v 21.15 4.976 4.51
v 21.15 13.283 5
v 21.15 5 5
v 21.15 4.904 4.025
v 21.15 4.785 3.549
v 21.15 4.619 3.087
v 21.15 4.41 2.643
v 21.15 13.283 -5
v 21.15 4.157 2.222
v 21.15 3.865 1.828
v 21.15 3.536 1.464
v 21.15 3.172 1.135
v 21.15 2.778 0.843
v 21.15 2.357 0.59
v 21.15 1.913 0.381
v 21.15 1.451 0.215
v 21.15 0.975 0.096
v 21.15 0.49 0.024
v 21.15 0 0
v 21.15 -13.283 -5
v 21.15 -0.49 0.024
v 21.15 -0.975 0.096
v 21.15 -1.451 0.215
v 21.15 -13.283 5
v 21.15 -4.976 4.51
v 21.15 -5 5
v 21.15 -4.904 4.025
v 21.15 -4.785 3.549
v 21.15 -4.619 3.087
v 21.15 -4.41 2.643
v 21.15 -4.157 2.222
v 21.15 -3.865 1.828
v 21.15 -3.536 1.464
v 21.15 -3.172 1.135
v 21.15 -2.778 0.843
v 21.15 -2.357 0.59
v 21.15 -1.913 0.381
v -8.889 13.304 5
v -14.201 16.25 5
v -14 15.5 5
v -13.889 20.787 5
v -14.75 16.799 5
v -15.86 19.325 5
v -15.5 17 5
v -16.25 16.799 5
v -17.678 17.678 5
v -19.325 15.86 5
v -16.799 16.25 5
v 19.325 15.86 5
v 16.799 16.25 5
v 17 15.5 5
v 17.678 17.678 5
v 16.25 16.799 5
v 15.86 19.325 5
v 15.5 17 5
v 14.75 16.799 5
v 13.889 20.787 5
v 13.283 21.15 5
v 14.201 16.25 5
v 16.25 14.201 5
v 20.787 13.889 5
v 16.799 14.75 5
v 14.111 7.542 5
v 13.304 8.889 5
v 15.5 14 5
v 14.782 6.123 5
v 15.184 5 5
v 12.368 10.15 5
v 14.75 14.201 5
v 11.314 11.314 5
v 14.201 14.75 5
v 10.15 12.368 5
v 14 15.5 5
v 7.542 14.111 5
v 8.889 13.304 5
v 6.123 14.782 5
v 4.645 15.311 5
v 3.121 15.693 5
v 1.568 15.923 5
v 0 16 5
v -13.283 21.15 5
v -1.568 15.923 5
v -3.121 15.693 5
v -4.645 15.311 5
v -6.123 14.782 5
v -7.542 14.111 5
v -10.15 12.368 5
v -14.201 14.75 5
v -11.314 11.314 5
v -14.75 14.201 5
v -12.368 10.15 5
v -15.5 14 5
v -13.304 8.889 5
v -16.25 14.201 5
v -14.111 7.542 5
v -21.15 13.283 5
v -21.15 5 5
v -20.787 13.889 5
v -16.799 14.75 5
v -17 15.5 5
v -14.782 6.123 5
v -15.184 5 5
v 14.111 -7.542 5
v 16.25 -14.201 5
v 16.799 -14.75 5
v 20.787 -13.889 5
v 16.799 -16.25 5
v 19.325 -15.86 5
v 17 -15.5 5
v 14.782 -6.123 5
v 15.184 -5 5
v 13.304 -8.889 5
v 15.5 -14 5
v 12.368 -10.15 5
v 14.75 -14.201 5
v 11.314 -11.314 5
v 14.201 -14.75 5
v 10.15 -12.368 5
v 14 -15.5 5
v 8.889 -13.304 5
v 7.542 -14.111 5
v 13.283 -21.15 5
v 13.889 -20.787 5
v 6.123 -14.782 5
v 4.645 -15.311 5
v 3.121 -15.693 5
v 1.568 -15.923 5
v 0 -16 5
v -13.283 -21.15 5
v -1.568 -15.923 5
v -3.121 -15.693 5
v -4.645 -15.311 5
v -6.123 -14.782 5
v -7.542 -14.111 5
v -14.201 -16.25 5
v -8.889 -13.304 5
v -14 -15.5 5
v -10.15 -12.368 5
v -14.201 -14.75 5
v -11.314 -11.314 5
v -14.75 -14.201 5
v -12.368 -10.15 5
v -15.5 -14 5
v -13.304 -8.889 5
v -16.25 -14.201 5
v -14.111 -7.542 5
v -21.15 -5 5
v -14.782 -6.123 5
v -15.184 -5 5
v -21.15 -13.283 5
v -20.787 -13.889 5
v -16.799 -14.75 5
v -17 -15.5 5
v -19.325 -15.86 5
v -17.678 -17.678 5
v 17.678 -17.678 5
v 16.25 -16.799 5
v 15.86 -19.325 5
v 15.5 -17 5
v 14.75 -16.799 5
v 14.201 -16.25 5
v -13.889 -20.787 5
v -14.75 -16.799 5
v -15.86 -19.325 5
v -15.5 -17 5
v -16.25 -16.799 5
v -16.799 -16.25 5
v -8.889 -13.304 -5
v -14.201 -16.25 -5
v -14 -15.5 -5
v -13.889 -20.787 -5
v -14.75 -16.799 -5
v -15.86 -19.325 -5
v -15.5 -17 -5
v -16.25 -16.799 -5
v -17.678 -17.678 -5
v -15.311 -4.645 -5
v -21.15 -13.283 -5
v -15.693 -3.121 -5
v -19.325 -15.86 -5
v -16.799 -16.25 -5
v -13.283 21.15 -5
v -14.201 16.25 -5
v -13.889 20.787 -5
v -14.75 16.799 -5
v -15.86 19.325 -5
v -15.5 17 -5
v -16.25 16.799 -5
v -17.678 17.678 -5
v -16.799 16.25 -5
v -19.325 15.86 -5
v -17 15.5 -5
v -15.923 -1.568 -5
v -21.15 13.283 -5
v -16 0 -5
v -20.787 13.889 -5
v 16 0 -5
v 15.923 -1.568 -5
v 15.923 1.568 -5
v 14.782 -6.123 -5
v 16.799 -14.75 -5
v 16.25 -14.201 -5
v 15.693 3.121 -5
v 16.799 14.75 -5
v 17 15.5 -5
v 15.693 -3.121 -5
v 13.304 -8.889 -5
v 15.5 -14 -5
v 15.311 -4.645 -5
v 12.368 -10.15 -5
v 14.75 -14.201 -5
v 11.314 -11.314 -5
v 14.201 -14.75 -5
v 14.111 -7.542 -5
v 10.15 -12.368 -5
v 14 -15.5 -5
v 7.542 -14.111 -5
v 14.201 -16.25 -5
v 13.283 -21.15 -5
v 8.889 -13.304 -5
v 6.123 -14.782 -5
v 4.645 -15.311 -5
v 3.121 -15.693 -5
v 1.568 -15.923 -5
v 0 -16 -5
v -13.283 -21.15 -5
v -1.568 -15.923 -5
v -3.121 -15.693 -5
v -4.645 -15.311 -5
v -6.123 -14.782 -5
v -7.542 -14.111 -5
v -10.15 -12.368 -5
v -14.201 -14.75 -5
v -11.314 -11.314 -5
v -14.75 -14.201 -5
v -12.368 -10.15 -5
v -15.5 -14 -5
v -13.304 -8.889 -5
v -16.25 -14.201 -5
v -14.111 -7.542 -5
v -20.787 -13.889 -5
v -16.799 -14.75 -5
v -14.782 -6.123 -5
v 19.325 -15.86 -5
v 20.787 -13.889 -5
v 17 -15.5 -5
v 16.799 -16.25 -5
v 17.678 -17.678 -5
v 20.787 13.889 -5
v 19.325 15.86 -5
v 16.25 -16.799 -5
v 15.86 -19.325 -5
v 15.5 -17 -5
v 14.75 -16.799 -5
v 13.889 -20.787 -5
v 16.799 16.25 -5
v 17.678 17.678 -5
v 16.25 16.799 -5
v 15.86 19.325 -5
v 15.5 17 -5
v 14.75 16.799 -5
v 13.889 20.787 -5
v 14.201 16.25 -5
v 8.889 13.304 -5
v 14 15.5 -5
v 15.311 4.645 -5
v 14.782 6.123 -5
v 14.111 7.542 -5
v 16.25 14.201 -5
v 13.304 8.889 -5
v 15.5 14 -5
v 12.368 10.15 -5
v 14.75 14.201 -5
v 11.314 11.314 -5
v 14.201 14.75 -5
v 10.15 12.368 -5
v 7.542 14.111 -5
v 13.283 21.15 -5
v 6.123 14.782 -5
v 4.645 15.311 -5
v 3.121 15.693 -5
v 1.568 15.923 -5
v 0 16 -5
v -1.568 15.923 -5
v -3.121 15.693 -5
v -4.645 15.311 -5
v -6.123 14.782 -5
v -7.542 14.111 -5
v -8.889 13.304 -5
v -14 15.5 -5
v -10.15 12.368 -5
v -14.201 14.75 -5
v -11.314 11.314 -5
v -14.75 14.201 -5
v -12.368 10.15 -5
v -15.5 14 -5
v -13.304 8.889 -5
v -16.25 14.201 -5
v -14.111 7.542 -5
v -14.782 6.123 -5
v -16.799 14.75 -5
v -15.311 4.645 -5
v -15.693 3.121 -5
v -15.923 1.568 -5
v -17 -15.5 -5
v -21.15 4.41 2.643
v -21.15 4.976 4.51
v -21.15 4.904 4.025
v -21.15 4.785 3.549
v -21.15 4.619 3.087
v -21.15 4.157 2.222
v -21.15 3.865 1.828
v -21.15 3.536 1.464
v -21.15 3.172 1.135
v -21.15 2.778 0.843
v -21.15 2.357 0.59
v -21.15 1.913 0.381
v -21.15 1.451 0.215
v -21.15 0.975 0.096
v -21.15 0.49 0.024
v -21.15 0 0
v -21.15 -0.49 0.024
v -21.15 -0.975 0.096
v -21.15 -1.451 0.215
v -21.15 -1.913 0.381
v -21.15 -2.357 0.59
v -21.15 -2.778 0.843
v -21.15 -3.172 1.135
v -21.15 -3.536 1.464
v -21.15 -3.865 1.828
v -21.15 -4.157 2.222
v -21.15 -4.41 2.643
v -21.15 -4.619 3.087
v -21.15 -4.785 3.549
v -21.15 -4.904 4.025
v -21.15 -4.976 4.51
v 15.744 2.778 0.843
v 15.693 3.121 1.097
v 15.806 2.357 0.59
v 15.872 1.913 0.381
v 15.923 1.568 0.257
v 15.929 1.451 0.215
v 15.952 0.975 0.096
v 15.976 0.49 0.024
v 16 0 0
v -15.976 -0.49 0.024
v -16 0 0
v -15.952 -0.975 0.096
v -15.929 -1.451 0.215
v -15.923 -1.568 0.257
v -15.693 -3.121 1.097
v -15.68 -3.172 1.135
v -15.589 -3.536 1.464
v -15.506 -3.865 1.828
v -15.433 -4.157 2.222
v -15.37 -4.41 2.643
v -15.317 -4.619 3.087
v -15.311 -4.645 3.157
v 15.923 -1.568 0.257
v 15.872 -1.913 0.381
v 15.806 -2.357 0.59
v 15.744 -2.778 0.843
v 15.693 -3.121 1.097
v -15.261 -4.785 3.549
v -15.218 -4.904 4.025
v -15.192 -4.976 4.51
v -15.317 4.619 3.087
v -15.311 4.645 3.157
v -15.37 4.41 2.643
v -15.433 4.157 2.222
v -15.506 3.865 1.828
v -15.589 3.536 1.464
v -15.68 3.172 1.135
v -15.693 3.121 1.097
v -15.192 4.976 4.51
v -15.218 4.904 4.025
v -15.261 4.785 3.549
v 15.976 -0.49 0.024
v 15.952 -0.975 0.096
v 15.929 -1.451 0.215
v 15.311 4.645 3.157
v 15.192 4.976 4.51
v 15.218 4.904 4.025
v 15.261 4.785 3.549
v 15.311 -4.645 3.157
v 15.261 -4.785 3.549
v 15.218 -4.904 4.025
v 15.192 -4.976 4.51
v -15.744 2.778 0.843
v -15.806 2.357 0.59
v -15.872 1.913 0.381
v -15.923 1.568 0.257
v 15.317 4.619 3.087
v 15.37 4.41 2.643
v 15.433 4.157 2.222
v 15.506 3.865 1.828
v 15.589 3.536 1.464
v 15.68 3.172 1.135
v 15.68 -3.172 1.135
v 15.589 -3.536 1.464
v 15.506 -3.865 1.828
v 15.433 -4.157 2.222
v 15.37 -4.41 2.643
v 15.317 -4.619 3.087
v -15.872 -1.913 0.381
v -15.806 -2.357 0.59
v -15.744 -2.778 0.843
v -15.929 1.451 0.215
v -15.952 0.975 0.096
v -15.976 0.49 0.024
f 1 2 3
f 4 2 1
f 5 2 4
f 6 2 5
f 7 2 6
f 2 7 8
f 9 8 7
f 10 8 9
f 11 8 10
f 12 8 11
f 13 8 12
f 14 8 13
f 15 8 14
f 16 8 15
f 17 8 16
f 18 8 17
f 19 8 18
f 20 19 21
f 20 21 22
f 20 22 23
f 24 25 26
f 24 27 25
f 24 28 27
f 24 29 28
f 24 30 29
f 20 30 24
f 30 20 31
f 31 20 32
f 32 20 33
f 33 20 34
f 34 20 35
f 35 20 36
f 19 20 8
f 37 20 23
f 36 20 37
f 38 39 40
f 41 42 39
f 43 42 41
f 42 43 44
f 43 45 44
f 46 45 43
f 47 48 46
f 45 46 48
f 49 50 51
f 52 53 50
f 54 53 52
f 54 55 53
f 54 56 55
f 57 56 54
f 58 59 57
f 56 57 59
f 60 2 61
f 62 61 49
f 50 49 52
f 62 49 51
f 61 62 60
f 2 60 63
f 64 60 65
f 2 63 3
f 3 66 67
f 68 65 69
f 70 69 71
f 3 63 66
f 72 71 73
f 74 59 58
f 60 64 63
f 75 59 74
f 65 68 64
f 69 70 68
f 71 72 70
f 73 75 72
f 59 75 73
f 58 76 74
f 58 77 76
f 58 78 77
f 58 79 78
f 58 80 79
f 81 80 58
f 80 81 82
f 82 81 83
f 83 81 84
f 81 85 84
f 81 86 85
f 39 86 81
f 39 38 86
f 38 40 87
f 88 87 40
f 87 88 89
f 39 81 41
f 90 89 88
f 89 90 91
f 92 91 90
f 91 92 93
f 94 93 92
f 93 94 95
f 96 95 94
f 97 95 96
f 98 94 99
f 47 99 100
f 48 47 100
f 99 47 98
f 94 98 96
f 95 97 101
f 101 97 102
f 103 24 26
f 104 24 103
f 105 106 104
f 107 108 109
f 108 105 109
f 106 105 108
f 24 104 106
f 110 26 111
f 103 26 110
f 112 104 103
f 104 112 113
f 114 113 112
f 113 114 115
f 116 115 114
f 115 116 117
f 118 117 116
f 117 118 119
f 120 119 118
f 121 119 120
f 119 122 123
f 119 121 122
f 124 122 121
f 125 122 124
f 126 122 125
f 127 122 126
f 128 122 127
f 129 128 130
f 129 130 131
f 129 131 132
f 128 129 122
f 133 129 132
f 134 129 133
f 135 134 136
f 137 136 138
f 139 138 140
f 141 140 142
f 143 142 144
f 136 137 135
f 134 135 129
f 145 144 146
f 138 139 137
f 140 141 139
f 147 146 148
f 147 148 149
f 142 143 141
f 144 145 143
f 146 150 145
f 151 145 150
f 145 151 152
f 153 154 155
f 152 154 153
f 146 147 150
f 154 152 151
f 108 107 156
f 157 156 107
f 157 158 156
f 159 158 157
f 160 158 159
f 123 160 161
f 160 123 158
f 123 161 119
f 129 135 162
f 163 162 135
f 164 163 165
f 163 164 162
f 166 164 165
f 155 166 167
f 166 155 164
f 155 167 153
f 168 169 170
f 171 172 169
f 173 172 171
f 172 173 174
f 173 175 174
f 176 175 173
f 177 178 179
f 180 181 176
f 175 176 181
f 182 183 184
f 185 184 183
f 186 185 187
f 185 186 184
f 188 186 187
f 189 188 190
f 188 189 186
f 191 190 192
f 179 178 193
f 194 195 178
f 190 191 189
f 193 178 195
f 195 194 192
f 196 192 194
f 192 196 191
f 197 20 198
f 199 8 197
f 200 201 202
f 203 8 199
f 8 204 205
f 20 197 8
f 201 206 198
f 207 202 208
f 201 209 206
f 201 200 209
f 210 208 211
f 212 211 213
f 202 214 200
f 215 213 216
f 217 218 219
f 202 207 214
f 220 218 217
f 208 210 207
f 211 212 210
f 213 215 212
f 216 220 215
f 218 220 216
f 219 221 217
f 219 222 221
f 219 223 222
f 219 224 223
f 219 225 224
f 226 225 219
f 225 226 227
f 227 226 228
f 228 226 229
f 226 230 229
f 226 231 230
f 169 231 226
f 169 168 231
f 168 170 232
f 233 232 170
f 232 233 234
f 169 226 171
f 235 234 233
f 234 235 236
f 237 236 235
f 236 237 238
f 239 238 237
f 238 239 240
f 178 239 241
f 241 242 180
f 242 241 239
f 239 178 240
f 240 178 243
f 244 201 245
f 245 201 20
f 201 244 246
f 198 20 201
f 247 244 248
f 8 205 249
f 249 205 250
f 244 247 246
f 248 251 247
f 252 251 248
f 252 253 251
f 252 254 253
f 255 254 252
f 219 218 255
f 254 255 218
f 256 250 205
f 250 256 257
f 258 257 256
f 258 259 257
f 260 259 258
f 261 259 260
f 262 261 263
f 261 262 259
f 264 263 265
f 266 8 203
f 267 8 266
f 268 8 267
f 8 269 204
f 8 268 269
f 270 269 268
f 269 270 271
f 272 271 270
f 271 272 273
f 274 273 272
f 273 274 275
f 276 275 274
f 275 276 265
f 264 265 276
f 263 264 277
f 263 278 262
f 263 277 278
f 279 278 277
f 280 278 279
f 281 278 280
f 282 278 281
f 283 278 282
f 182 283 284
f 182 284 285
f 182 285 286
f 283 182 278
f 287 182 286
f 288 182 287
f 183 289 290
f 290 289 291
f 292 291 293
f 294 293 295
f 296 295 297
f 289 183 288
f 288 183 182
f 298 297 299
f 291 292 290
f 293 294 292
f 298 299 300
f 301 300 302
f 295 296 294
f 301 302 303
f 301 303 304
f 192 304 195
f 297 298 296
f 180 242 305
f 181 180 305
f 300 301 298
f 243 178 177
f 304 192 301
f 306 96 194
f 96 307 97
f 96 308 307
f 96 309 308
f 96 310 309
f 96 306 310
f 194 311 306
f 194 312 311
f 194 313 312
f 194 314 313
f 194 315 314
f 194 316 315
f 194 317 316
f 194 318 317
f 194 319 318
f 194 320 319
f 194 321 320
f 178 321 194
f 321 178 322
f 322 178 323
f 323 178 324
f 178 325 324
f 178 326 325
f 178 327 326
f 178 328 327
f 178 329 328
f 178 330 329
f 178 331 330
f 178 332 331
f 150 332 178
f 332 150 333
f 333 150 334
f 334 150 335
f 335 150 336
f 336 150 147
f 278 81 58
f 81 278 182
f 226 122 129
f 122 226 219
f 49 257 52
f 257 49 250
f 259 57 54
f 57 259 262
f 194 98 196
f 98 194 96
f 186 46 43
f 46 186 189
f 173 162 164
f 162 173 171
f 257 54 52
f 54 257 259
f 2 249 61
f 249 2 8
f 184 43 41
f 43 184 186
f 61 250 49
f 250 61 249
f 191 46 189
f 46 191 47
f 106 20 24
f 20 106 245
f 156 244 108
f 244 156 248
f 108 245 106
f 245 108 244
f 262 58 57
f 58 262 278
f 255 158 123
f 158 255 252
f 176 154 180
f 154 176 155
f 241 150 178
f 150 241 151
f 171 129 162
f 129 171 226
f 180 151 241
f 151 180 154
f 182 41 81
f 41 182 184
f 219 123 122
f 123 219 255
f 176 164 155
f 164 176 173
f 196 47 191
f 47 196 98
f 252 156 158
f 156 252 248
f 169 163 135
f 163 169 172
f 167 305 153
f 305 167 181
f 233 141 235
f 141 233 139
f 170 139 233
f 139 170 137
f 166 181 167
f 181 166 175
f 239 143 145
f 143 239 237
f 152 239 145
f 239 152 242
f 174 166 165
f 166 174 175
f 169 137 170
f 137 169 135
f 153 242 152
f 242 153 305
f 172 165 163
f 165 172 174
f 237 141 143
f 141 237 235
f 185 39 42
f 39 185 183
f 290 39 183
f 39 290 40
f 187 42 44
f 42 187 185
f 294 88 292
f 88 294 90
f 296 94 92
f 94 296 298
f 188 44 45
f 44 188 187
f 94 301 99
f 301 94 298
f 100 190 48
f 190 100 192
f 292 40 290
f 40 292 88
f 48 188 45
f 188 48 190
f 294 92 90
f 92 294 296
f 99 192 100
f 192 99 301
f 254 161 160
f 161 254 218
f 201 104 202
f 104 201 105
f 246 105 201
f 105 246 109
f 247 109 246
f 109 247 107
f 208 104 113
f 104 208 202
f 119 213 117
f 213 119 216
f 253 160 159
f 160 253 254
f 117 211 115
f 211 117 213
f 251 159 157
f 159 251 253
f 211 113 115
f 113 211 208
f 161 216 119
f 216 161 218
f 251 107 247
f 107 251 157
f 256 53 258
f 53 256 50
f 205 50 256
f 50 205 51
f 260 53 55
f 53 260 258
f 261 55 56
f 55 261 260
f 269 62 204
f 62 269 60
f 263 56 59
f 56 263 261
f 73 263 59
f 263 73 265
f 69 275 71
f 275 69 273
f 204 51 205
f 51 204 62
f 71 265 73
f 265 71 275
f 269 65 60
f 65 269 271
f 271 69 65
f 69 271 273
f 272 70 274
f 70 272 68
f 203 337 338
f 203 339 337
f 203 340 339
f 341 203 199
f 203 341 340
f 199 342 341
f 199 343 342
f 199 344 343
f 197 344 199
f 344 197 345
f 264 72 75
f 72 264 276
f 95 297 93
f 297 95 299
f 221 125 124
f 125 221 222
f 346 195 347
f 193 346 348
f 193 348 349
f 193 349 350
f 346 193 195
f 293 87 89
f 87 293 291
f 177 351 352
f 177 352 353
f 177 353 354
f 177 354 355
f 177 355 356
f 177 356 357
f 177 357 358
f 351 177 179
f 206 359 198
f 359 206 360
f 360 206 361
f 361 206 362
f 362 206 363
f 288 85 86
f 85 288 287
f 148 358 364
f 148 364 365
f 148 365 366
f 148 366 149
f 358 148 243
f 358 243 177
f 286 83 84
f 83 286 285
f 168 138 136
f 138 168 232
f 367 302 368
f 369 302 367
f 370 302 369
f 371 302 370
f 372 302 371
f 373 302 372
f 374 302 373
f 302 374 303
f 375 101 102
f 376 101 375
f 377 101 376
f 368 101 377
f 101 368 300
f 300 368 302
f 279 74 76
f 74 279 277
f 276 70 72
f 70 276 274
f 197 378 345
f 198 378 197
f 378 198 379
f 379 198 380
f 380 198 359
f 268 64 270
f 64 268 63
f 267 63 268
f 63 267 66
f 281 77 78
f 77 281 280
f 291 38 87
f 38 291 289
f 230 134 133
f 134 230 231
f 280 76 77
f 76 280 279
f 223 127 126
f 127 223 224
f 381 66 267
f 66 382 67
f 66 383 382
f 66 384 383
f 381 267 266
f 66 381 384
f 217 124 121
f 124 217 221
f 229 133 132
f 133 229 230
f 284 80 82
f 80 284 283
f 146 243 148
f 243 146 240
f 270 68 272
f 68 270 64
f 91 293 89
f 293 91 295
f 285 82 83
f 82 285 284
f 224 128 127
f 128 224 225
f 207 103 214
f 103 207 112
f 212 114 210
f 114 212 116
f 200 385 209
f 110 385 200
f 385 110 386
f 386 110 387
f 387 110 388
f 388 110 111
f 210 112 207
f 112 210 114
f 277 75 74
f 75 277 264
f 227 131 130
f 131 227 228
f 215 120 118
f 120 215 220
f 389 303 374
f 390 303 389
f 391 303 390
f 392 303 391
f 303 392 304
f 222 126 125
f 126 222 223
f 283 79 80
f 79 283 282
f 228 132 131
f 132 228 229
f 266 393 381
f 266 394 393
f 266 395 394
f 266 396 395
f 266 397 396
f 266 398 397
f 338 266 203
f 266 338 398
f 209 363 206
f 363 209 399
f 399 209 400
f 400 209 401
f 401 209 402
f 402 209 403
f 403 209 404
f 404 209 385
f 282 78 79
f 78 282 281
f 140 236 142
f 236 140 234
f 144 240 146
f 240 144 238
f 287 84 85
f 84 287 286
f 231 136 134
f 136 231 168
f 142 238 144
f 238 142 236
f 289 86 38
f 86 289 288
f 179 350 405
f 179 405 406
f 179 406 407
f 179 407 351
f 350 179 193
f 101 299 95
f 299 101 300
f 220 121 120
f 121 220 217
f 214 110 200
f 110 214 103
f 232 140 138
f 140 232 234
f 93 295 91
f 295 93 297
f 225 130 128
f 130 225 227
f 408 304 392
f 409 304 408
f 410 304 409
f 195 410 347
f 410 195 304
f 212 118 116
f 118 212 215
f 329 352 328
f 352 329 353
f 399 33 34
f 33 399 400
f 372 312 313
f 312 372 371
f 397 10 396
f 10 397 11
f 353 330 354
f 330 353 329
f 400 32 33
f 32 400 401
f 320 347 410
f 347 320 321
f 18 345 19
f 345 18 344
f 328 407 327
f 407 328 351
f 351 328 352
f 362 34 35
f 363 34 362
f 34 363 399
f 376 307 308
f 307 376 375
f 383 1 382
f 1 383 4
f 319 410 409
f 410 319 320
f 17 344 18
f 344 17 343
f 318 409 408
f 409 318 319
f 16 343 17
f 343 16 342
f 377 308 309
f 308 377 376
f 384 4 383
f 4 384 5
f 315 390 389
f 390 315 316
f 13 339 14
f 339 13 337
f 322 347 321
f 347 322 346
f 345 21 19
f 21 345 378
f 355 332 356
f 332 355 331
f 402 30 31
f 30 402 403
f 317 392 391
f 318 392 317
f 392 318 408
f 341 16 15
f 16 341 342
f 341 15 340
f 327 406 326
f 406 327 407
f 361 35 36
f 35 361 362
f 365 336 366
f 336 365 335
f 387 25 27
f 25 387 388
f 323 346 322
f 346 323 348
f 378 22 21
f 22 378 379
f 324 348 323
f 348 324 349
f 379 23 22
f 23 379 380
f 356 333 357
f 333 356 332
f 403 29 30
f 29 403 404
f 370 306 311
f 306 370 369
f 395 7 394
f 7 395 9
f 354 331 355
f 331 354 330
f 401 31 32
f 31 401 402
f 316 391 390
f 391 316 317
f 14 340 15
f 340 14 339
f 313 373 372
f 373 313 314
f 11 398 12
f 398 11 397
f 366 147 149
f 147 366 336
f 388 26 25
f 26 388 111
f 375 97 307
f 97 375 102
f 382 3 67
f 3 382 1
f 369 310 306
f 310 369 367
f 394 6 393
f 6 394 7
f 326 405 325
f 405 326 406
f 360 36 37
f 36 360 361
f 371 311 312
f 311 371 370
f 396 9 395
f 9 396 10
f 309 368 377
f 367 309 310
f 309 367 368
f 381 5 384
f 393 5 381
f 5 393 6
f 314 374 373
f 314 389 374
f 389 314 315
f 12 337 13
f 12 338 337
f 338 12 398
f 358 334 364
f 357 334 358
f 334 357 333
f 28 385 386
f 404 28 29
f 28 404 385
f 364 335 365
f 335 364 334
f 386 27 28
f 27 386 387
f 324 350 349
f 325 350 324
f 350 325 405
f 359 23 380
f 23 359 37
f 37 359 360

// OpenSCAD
// Spacer for a NEMA17 stepper.
// On Kossel, enables original Grabercars spools, which would otherwise be too long, to fit.

height = 10.0;
width = 42.3;
hole_spacing = 31.0;
hole_diameter = 3.0;
hole_radius = hole_diameter/2;
edge_diameter = 50.0; // Measured size of turned corner of NEMA17.
edge_radius = edge_diameter/2;
center_cutout_diameter = 32;
center_cutout_radius = center_cutout_diameter/2;
cutout_width = 10;

difference() {
	intersection() {
		cube([width, width, height], center=true);
		rotate(0, 90, 0) cylinder(r=edge_radius, h=height*2, center=true, $fn=64);
	}
	for(i = [-1, 1]) {
		for(j = [-1, 1]) {
			translate([i*hole_spacing/2, j*hole_spacing/2, 0]) cylinder(r=hole_radius, h=height*2, center=true, $fn=12);
		}
	}
	rotate(0, 90, 0) cylinder(r=center_cutout_radius, h=height*2, center=true, $fn=64);
	translate([0, 0, height/2]) rotate([0, 90, 0]) cylinder(r=height/2, h=width * 2, $fn=64, center=true);
}
